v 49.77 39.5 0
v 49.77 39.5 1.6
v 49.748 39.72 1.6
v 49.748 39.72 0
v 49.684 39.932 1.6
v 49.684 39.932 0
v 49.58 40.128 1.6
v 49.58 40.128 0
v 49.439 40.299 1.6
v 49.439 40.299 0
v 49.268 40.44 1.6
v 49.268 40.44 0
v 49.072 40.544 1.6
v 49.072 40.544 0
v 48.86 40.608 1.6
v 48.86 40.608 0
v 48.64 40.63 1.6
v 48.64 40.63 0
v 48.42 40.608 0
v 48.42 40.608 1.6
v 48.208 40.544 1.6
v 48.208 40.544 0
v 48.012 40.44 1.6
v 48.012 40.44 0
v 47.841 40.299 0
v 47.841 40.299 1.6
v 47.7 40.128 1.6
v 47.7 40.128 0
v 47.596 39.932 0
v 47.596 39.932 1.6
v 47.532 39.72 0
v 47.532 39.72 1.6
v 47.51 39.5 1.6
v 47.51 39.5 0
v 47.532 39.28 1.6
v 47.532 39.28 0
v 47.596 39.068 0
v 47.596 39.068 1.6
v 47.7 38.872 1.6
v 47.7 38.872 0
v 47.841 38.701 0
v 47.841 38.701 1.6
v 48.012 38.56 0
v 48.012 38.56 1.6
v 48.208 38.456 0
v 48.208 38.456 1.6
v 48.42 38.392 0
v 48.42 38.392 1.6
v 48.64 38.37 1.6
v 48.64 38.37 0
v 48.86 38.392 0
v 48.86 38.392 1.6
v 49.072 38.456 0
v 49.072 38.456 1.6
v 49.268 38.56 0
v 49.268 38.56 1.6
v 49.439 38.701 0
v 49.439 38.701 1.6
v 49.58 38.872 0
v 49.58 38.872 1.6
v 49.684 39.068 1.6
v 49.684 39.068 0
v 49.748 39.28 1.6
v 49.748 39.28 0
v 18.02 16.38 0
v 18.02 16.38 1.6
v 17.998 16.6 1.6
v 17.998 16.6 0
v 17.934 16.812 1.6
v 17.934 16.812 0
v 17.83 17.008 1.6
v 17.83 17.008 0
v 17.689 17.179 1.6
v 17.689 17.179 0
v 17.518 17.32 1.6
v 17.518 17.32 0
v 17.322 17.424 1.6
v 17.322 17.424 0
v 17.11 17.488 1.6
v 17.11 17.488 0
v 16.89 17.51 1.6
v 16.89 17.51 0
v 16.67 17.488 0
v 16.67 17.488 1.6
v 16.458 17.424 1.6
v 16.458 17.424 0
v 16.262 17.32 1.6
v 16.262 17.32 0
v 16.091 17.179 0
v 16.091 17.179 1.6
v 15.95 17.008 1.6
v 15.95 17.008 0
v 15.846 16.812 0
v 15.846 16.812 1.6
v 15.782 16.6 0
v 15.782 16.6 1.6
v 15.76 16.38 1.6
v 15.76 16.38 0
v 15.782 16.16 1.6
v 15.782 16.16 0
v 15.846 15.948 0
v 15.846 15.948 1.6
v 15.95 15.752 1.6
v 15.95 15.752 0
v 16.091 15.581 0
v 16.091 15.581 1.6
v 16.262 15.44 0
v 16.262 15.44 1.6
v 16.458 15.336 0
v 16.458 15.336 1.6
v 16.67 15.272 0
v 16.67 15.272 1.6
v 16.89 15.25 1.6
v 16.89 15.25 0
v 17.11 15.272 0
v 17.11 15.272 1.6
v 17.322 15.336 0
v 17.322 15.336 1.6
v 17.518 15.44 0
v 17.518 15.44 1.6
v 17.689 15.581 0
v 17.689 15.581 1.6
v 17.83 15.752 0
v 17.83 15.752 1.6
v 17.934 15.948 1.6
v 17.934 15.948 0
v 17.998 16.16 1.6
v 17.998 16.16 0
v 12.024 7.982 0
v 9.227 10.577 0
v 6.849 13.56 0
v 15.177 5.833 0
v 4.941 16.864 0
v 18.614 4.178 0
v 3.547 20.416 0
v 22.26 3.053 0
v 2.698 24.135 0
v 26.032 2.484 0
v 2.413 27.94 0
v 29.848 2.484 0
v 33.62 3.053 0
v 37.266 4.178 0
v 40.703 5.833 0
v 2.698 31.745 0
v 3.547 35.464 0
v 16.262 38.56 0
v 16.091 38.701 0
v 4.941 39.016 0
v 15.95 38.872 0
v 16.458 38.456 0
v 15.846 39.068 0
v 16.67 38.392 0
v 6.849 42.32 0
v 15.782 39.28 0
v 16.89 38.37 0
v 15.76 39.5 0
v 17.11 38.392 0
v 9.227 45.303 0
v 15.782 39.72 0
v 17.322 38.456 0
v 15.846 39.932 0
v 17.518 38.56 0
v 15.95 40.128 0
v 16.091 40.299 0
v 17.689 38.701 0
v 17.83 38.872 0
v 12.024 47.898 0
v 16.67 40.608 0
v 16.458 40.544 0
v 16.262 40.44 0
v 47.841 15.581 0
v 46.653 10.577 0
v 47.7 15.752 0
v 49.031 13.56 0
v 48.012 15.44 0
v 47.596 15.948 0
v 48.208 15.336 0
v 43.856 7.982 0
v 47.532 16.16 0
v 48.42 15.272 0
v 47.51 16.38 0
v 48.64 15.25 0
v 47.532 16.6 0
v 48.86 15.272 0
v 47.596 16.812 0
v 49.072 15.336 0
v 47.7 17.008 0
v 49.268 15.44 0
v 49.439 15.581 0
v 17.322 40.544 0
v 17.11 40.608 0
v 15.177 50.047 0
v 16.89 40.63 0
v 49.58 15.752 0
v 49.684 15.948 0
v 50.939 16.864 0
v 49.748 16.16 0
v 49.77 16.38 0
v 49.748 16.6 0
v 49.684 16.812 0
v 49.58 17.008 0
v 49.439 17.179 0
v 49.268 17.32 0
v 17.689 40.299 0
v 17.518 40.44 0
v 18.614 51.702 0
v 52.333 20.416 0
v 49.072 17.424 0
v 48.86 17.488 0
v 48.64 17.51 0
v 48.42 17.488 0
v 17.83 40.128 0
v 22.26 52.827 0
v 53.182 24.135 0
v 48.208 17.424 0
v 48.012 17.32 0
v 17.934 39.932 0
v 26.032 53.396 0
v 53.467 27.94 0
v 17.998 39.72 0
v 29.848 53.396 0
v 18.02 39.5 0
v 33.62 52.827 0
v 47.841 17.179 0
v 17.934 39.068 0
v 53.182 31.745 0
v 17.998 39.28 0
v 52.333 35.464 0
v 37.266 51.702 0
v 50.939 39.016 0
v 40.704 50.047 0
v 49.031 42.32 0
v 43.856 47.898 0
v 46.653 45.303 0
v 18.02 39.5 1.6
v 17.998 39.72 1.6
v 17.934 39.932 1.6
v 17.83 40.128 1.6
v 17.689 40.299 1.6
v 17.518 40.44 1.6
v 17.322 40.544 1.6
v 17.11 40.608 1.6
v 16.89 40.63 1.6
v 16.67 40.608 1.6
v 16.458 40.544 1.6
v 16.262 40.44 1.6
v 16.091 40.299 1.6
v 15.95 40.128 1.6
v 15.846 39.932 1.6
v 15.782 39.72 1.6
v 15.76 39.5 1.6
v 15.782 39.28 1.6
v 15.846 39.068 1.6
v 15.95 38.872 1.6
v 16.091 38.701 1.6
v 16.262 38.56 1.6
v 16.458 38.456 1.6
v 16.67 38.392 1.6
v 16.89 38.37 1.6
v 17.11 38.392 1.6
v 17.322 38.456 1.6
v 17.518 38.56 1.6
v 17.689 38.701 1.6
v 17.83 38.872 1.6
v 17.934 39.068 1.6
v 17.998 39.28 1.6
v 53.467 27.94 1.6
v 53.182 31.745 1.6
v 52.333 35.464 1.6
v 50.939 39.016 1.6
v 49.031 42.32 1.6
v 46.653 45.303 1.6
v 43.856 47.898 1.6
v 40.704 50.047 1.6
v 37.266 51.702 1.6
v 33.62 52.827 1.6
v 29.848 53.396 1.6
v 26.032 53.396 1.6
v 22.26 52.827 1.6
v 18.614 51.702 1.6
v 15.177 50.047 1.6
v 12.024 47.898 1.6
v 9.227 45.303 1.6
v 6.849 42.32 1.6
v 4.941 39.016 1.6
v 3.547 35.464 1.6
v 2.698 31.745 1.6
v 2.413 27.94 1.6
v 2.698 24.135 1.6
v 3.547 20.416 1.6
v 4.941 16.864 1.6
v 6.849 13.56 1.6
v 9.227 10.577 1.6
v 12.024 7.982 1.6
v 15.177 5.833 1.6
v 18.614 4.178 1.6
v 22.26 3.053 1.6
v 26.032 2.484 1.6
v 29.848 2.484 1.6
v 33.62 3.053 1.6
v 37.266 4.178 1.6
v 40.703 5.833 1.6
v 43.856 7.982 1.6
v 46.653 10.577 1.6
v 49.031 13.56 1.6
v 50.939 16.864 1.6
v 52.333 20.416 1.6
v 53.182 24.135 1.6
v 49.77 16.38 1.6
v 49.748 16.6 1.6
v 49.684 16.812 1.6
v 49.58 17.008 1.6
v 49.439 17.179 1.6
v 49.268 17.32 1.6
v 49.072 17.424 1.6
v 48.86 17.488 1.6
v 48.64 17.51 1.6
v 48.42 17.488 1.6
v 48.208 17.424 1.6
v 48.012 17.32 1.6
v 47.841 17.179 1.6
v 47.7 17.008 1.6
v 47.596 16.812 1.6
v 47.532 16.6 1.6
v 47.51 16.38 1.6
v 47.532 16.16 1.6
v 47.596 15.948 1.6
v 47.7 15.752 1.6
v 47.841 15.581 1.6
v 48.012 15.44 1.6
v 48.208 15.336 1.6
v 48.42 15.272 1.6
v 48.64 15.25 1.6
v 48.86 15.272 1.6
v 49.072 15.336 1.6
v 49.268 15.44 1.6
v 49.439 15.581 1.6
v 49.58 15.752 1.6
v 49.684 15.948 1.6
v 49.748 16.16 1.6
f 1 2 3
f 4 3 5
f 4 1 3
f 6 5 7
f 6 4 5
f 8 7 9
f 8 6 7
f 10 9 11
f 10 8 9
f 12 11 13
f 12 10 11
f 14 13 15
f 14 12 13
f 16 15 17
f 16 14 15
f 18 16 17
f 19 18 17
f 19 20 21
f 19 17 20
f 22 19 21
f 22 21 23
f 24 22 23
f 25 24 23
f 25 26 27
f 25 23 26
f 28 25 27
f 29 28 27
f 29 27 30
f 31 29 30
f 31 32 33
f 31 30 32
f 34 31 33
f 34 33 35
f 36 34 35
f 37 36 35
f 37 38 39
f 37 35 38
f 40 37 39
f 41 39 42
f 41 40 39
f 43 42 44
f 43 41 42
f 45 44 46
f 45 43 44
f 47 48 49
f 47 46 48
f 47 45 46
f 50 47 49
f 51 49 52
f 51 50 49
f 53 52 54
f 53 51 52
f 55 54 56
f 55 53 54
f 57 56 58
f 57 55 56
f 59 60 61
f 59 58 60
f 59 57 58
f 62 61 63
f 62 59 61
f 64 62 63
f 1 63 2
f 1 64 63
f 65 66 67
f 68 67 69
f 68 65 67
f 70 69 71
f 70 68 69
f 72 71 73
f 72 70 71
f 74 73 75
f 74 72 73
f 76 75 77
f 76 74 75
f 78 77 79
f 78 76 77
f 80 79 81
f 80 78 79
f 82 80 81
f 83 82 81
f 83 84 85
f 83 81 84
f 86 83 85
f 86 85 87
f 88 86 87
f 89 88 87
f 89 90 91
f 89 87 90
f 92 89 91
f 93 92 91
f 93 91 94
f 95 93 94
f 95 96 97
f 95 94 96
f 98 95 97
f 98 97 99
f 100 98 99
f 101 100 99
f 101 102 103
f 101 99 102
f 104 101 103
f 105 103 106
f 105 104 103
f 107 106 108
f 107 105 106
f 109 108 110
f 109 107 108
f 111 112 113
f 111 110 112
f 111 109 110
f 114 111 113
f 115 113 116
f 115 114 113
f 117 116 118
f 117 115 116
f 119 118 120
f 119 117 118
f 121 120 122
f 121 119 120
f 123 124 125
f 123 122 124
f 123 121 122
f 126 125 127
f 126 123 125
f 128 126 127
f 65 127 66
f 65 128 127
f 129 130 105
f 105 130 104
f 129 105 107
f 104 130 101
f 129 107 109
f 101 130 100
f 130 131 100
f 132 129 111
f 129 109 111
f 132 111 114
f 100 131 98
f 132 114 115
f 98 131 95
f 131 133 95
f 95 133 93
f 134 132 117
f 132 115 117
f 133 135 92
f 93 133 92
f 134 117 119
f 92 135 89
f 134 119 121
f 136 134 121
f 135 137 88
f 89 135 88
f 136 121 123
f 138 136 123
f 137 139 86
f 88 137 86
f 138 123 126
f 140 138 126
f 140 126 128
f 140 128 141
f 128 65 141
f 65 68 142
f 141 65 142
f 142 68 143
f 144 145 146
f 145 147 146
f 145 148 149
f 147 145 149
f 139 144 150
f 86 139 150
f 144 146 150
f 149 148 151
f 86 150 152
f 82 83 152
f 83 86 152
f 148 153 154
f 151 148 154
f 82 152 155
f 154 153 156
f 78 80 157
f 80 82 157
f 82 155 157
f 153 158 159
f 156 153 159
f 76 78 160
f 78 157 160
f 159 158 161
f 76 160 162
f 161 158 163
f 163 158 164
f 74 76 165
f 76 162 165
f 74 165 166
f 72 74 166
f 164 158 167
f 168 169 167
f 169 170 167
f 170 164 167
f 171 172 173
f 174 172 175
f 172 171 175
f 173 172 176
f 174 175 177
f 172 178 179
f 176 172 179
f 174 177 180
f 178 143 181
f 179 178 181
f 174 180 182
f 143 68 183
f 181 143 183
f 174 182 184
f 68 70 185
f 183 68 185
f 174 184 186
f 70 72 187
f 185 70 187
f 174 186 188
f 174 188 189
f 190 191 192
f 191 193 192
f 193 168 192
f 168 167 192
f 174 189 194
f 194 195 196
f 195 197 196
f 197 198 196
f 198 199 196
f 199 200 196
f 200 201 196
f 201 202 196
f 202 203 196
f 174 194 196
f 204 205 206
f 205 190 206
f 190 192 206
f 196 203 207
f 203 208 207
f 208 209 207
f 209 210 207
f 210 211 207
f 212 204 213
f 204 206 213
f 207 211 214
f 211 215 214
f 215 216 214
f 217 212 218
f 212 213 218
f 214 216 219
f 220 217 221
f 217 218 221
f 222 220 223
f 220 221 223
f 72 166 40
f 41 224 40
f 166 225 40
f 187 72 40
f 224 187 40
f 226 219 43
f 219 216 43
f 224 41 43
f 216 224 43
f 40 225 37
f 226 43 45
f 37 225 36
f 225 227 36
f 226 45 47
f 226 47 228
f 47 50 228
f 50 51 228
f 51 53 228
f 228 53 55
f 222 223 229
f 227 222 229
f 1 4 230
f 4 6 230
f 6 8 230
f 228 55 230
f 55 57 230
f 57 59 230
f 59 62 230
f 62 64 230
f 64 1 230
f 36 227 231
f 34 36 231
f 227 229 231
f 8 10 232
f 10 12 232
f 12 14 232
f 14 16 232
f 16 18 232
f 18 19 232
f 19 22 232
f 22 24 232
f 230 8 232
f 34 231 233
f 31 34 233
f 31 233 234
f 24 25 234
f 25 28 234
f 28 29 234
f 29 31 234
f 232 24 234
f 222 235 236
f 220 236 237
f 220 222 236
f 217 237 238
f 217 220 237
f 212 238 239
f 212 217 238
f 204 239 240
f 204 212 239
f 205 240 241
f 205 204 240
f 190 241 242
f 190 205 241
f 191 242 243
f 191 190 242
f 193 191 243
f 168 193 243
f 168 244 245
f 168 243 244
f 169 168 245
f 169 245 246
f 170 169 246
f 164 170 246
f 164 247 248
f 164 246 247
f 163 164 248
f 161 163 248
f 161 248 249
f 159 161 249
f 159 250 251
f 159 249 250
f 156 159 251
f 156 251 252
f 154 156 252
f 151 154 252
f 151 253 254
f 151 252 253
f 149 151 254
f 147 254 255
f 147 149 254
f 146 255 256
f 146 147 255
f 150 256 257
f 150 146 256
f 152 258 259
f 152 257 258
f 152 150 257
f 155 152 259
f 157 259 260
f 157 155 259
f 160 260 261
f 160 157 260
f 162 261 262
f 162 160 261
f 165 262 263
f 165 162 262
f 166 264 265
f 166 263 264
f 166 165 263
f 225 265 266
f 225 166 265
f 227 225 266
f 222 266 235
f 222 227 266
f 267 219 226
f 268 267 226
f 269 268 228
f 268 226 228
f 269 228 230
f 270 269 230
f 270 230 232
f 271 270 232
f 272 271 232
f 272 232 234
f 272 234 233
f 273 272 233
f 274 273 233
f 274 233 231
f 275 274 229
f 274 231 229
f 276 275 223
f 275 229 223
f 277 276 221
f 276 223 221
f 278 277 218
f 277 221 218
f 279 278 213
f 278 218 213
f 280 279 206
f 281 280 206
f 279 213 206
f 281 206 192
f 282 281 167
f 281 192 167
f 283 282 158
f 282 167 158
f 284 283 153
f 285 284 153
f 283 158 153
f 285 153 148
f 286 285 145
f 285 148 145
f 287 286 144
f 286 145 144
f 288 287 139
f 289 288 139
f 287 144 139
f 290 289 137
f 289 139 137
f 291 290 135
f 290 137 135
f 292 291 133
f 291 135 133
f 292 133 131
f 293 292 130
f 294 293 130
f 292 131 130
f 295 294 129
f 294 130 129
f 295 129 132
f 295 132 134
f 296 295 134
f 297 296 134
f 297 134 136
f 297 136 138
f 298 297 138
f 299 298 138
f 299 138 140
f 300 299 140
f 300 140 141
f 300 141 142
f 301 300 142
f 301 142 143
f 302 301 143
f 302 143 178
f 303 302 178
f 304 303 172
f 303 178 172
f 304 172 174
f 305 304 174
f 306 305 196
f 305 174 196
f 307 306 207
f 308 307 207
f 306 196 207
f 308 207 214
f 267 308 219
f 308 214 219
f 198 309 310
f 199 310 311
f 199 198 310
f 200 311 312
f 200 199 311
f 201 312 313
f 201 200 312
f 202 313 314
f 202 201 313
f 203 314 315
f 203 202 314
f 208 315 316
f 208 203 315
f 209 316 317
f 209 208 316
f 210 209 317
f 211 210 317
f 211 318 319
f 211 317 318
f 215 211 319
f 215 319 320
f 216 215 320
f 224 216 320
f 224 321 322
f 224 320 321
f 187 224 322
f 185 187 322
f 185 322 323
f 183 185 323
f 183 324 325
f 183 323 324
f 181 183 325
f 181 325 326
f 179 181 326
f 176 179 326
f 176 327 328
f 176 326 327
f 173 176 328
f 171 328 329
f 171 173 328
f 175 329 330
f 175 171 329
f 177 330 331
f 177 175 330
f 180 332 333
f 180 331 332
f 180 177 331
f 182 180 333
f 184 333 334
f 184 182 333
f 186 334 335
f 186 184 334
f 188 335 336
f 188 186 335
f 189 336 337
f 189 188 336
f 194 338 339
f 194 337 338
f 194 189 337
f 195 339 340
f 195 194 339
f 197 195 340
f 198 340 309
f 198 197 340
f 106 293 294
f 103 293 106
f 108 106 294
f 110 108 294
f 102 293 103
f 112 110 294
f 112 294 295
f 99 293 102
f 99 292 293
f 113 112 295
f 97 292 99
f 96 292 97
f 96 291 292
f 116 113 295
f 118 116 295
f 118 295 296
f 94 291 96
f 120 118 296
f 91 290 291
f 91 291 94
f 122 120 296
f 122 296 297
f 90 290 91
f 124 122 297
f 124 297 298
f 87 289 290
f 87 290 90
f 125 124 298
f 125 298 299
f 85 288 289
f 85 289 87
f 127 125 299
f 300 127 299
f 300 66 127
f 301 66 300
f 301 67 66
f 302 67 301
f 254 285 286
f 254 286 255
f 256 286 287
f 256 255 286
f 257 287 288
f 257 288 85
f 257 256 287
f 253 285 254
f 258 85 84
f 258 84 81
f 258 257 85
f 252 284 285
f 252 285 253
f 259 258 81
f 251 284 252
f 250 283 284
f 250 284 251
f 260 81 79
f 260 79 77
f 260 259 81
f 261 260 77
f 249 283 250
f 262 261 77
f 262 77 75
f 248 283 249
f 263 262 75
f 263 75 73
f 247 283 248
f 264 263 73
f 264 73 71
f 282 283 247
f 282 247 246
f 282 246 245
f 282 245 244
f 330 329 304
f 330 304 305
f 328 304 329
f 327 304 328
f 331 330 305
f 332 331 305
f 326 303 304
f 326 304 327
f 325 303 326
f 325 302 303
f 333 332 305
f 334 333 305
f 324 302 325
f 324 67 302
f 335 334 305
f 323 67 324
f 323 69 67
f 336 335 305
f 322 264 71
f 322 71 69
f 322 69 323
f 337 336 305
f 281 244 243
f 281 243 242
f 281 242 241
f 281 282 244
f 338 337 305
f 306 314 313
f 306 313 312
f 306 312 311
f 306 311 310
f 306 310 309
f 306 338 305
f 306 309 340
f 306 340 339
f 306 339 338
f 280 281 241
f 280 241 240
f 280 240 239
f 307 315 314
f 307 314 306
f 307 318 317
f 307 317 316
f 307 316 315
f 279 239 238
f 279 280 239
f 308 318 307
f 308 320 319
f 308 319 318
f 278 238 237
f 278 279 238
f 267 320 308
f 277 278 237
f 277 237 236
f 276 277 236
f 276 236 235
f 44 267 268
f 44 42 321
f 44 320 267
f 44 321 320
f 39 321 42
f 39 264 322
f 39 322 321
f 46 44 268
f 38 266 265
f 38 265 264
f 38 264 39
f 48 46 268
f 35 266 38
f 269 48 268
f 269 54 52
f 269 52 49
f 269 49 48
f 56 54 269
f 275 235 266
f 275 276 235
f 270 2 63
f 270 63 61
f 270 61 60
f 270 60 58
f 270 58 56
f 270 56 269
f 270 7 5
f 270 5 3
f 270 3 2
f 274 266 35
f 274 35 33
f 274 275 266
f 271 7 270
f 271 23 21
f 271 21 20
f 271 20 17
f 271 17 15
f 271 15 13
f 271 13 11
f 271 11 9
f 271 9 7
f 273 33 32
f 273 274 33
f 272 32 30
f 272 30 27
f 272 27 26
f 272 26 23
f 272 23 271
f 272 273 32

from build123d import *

# Parameters (mm, degrees)
SKETCH1_R              = 25.527
BOARD_DEPTH            = 1.6
SKETCH2_R              = 1.13
NON_PLATED_HOLES_DEPTH = 76.630682782


with BuildPart() as part:
    # Sketch1 → BOARD (new body)
    with BuildSketch(Plane.XY):
        with Locations((27.94, 27.94)):
            Circle(SKETCH1_R)
    extrude(amount=BOARD_DEPTH)

    # Sketch2 → NON-PLATED HOLES (cut, through all)
    with BuildSketch(Plane.XY):
        with Locations((48.64, 39.5)):
            Circle(SKETCH2_R)
        with Locations((48.64, 16.38)):
            Circle(SKETCH2_R)
        with Locations((16.89, 39.5)):
            Circle(SKETCH2_R)
        with Locations((16.89, 16.38)):
            Circle(SKETCH2_R)
    extrude(amount=NON_PLATED_HOLES_DEPTH, mode=Mode.SUBTRACT)


solid = part.part
